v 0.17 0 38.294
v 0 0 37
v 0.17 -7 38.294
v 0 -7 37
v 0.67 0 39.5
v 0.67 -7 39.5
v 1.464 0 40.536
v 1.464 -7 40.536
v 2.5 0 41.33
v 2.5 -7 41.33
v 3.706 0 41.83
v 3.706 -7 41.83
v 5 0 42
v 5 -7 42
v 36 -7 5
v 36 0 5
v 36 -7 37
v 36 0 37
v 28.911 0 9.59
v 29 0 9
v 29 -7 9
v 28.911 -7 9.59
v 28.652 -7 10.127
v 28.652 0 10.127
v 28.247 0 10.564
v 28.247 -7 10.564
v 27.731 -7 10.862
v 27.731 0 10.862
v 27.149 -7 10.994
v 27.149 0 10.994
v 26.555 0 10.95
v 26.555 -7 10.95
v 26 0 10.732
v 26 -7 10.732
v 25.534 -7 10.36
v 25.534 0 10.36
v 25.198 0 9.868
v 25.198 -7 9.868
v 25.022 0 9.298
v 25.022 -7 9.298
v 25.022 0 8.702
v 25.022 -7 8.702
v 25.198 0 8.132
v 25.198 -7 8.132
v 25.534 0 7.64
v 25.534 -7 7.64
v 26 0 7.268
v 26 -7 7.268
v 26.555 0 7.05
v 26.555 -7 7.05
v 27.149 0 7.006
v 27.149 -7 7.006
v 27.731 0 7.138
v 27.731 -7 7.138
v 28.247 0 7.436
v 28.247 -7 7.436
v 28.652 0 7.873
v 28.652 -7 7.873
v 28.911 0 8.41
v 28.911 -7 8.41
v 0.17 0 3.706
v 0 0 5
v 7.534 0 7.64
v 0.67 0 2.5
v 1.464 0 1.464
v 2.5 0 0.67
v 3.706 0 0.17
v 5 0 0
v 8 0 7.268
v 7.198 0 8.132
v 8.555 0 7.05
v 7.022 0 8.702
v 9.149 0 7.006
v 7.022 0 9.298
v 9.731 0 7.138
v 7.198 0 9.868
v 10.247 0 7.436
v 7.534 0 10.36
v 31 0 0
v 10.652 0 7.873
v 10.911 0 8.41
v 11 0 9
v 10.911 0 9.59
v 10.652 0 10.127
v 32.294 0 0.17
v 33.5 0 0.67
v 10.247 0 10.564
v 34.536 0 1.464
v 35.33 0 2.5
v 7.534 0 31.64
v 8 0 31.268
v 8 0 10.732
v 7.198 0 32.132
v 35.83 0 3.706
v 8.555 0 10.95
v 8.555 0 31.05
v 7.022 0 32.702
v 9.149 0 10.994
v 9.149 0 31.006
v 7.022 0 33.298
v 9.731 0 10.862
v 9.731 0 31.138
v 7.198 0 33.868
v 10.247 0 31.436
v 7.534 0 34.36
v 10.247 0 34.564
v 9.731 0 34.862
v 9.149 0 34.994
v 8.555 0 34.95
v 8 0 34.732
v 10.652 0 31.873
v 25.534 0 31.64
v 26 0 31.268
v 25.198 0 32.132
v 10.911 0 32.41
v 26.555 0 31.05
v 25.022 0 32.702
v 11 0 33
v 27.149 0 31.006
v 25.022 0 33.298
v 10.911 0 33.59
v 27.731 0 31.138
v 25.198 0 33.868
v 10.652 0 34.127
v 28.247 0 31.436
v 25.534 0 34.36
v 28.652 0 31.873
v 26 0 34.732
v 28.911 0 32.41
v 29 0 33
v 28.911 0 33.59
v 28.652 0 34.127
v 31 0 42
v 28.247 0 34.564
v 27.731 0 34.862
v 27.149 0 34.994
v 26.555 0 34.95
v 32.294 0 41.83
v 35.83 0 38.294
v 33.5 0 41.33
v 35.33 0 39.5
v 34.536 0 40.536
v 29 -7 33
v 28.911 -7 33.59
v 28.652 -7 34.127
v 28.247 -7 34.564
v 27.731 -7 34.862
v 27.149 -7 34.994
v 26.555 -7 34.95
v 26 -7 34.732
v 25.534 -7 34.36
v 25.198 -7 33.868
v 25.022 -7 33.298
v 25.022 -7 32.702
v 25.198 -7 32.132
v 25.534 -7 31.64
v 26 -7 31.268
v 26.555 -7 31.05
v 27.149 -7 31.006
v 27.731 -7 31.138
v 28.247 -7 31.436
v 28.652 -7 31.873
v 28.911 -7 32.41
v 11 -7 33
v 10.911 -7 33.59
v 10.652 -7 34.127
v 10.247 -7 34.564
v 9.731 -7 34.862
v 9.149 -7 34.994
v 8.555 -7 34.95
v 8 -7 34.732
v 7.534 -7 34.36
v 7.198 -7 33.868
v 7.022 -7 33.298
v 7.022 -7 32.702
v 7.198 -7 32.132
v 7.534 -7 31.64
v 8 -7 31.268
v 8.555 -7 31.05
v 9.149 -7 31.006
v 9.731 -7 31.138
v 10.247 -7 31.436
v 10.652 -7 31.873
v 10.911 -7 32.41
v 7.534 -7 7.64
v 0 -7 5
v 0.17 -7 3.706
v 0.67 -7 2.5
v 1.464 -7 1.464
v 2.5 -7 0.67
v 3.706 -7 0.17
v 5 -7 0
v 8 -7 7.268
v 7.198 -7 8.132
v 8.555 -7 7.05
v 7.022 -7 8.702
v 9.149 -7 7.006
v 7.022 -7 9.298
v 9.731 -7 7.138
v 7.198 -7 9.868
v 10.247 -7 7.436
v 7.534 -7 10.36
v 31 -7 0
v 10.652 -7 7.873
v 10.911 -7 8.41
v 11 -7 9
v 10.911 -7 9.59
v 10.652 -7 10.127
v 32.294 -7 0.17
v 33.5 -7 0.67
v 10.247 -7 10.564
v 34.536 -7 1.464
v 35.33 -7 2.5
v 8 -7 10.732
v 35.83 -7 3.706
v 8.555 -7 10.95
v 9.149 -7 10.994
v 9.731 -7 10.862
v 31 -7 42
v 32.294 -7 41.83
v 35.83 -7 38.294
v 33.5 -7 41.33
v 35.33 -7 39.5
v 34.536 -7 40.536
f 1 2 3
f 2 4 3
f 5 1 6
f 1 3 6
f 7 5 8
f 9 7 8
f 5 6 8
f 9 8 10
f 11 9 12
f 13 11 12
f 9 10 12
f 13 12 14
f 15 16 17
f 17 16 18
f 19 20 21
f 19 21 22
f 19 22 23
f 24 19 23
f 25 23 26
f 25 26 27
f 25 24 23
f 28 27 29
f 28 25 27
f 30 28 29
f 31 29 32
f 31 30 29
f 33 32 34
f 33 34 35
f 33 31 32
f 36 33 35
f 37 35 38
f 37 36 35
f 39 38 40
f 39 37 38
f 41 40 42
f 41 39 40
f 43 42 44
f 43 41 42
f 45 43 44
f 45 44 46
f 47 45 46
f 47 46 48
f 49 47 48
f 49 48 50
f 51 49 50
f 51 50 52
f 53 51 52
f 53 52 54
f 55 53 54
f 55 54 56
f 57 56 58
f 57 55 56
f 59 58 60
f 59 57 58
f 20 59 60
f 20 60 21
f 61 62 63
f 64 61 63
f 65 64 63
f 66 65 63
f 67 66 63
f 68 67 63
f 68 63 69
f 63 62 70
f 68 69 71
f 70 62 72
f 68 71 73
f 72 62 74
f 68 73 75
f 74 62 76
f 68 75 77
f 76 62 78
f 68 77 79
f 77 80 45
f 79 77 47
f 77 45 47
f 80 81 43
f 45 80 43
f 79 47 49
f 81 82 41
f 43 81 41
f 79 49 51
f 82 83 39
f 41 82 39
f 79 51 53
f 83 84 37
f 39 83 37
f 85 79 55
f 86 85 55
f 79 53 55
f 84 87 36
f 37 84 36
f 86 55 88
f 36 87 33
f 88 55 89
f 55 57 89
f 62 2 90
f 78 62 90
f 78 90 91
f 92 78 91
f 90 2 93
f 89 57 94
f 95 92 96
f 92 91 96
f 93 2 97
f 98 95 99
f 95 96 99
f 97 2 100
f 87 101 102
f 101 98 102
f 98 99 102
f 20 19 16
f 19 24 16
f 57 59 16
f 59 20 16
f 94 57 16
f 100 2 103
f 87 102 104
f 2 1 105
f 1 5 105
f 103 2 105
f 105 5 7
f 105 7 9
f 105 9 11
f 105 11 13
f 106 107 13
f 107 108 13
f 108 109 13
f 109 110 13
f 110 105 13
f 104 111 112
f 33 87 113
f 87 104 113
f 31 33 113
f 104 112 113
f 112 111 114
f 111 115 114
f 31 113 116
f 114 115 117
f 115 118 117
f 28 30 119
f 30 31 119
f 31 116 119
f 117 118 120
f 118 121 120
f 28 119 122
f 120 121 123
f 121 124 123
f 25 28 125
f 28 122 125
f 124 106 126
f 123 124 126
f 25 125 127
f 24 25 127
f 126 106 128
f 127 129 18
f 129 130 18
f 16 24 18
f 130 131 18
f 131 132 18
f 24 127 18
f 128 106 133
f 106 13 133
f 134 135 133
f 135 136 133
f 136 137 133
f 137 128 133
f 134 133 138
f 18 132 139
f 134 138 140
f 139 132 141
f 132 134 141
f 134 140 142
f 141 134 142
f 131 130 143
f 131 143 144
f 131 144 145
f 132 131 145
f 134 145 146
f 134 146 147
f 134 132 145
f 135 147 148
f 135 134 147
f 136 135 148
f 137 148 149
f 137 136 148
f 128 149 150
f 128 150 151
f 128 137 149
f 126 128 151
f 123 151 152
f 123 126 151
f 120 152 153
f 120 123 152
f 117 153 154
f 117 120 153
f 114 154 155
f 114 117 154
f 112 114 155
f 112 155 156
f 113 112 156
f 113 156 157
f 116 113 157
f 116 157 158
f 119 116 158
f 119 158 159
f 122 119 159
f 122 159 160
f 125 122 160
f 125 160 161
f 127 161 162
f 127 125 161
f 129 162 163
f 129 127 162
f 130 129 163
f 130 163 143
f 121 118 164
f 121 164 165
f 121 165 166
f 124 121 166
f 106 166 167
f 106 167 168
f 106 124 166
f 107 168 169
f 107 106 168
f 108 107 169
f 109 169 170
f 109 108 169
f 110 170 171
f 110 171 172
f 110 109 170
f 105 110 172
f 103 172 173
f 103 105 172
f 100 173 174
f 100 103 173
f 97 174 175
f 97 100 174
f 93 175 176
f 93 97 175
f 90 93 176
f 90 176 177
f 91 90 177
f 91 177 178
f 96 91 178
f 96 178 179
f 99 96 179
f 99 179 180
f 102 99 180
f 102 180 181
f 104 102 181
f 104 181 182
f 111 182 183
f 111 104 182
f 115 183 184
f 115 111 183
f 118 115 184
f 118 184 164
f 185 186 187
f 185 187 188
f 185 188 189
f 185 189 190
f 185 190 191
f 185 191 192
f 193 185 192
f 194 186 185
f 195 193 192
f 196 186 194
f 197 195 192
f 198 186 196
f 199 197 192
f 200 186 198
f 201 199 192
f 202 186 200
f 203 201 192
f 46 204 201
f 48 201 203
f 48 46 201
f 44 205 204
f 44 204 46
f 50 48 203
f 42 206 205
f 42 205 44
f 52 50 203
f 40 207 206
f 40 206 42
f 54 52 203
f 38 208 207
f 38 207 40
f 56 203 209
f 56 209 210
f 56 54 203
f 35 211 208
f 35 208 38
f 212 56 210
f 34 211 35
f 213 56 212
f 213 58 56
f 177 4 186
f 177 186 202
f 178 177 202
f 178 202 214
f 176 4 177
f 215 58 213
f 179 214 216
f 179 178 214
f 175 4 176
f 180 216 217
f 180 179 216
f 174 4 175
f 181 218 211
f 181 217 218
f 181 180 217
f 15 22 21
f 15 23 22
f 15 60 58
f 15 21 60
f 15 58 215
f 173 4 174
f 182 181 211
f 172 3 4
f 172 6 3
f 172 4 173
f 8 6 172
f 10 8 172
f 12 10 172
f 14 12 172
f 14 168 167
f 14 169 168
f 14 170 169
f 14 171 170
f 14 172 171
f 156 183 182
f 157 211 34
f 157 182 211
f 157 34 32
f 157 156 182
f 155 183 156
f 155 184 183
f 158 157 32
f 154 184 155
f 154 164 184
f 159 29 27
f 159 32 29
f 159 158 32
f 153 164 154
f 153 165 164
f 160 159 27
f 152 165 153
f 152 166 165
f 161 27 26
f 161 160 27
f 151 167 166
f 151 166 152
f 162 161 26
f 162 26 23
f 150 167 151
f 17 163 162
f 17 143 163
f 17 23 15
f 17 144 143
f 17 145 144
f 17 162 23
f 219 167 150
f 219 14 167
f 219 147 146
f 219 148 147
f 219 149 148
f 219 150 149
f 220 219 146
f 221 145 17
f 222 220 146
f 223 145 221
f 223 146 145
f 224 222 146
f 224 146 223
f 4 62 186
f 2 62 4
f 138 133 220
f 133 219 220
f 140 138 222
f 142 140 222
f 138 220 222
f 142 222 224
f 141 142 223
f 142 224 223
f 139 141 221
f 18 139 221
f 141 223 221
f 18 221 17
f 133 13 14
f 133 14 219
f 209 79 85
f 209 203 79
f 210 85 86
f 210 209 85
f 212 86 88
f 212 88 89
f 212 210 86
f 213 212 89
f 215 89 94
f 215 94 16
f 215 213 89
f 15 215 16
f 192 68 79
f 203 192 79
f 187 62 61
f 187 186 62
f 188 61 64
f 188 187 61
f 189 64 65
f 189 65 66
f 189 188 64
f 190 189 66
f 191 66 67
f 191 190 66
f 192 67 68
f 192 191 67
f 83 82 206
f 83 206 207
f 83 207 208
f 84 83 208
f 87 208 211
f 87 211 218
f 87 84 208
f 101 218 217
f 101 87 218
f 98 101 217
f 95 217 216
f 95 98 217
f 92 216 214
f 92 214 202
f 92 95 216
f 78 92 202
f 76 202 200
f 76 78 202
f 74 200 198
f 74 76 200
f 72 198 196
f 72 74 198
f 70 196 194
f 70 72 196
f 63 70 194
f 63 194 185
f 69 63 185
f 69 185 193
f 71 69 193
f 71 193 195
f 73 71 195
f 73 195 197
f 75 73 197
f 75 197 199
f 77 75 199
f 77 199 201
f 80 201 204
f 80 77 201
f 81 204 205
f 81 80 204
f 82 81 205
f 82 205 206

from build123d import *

# Parameters (mm, degrees)
F0_W     = 36
F0_H     = 42
F0_R     = 2
F1_DEPTH = 7
F2_R     = 5


with BuildPart() as f1:
    # F0 (on Front) → F1 (new body)
    with BuildSketch(Plane.XZ):
        with Locations((18, 21)):
            Rectangle(F0_W, F0_H)
        with Locations((9, 9)):
            Circle(F0_R, mode=Mode.SUBTRACT)
        with Locations((27, 9)):
            Circle(F0_R, mode=Mode.SUBTRACT)
        with Locations((9, 33)):
            Circle(F0_R, mode=Mode.SUBTRACT)
        with Locations((27, 33)):
            Circle(F0_R, mode=Mode.SUBTRACT)
    extrude(amount=F1_DEPTH)

    # F2
    f2_edges = [f1.edges().sort_by_distance(p)[0] for p in [
        (0, -3.5, 42),
        (0, -3.5, 0),
        (36, -3.5, 0),
        (36, -3.5, 42),
    ]]
    fillet(f2_edges, radius=F2_R)


solid = f1.part
